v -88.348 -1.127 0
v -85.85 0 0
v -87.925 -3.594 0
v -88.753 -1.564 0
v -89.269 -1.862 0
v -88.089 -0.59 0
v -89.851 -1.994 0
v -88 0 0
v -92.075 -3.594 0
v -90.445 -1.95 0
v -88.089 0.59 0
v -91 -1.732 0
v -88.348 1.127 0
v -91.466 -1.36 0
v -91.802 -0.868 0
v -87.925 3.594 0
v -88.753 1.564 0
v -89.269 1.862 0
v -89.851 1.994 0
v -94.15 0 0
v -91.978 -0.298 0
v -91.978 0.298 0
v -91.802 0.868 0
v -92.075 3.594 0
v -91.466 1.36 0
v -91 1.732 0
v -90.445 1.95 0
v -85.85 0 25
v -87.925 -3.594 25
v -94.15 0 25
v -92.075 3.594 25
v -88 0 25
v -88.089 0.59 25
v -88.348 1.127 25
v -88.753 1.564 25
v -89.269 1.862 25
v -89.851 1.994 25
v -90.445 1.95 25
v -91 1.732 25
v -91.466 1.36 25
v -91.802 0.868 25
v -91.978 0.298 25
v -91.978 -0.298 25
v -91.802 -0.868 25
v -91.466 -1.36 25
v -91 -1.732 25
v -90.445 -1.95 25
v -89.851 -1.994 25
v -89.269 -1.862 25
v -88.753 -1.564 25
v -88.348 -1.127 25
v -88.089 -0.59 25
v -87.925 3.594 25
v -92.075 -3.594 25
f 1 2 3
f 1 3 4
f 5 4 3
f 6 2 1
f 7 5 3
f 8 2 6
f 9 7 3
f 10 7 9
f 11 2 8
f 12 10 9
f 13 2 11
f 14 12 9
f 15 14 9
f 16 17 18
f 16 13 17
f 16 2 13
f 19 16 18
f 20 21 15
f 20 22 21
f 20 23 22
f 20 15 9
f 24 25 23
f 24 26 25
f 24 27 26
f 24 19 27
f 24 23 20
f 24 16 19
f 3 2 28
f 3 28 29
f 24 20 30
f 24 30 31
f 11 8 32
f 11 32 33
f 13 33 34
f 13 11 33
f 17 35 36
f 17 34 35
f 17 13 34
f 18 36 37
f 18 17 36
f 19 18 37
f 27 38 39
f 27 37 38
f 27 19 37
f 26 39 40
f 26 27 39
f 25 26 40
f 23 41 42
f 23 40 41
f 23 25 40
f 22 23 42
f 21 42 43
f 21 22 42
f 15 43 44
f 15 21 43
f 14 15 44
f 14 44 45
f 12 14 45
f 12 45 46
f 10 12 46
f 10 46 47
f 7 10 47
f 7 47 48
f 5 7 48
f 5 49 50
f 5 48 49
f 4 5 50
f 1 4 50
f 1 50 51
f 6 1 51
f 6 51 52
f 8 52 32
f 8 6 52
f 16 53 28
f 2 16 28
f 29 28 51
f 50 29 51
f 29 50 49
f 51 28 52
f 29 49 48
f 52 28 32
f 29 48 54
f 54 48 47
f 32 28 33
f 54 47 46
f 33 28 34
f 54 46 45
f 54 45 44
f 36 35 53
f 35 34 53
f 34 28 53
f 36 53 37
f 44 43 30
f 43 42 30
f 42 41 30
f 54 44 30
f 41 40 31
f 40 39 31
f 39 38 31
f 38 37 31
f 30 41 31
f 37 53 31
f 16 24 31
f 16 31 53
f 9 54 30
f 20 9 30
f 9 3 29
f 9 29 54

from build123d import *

# Parameters (mm, degrees)
CYLINDER013_R     = 2
CYLINDER013_DEPTH = 50
PAD_DEPTH         = 25


with BuildPart() as cylinder013:
    # Cylinder013 → Cylinder013 (new body)
    with BuildSketch(Plane(origin=(-90, 0, -10), x_dir=(1, 0, 0), z_dir=(0, 0, 1))):
        Circle(CYLINDER013_R)
    extrude(amount=CYLINDER013_DEPTH)


with BuildPart() as entrtoise_25mm:
    # Polygon → Pad (new body)
    with BuildSketch(Plane(origin=(-90, 0, 0), x_dir=(1, 0, 0), z_dir=(0, 0, 1))):
        Polygon((2.075, 3.594005), (4.15, 0), (2.075, -3.594005), (-2.075, -3.594005), (-4.15, 0), (-2.075, 3.594005), align=None)
    extrude(amount=PAD_DEPTH)

    # Cut002002: cut Cylinder013
    add(cylinder013.part, mode=Mode.SUBTRACT)


solid = entrtoise_25mm.part
